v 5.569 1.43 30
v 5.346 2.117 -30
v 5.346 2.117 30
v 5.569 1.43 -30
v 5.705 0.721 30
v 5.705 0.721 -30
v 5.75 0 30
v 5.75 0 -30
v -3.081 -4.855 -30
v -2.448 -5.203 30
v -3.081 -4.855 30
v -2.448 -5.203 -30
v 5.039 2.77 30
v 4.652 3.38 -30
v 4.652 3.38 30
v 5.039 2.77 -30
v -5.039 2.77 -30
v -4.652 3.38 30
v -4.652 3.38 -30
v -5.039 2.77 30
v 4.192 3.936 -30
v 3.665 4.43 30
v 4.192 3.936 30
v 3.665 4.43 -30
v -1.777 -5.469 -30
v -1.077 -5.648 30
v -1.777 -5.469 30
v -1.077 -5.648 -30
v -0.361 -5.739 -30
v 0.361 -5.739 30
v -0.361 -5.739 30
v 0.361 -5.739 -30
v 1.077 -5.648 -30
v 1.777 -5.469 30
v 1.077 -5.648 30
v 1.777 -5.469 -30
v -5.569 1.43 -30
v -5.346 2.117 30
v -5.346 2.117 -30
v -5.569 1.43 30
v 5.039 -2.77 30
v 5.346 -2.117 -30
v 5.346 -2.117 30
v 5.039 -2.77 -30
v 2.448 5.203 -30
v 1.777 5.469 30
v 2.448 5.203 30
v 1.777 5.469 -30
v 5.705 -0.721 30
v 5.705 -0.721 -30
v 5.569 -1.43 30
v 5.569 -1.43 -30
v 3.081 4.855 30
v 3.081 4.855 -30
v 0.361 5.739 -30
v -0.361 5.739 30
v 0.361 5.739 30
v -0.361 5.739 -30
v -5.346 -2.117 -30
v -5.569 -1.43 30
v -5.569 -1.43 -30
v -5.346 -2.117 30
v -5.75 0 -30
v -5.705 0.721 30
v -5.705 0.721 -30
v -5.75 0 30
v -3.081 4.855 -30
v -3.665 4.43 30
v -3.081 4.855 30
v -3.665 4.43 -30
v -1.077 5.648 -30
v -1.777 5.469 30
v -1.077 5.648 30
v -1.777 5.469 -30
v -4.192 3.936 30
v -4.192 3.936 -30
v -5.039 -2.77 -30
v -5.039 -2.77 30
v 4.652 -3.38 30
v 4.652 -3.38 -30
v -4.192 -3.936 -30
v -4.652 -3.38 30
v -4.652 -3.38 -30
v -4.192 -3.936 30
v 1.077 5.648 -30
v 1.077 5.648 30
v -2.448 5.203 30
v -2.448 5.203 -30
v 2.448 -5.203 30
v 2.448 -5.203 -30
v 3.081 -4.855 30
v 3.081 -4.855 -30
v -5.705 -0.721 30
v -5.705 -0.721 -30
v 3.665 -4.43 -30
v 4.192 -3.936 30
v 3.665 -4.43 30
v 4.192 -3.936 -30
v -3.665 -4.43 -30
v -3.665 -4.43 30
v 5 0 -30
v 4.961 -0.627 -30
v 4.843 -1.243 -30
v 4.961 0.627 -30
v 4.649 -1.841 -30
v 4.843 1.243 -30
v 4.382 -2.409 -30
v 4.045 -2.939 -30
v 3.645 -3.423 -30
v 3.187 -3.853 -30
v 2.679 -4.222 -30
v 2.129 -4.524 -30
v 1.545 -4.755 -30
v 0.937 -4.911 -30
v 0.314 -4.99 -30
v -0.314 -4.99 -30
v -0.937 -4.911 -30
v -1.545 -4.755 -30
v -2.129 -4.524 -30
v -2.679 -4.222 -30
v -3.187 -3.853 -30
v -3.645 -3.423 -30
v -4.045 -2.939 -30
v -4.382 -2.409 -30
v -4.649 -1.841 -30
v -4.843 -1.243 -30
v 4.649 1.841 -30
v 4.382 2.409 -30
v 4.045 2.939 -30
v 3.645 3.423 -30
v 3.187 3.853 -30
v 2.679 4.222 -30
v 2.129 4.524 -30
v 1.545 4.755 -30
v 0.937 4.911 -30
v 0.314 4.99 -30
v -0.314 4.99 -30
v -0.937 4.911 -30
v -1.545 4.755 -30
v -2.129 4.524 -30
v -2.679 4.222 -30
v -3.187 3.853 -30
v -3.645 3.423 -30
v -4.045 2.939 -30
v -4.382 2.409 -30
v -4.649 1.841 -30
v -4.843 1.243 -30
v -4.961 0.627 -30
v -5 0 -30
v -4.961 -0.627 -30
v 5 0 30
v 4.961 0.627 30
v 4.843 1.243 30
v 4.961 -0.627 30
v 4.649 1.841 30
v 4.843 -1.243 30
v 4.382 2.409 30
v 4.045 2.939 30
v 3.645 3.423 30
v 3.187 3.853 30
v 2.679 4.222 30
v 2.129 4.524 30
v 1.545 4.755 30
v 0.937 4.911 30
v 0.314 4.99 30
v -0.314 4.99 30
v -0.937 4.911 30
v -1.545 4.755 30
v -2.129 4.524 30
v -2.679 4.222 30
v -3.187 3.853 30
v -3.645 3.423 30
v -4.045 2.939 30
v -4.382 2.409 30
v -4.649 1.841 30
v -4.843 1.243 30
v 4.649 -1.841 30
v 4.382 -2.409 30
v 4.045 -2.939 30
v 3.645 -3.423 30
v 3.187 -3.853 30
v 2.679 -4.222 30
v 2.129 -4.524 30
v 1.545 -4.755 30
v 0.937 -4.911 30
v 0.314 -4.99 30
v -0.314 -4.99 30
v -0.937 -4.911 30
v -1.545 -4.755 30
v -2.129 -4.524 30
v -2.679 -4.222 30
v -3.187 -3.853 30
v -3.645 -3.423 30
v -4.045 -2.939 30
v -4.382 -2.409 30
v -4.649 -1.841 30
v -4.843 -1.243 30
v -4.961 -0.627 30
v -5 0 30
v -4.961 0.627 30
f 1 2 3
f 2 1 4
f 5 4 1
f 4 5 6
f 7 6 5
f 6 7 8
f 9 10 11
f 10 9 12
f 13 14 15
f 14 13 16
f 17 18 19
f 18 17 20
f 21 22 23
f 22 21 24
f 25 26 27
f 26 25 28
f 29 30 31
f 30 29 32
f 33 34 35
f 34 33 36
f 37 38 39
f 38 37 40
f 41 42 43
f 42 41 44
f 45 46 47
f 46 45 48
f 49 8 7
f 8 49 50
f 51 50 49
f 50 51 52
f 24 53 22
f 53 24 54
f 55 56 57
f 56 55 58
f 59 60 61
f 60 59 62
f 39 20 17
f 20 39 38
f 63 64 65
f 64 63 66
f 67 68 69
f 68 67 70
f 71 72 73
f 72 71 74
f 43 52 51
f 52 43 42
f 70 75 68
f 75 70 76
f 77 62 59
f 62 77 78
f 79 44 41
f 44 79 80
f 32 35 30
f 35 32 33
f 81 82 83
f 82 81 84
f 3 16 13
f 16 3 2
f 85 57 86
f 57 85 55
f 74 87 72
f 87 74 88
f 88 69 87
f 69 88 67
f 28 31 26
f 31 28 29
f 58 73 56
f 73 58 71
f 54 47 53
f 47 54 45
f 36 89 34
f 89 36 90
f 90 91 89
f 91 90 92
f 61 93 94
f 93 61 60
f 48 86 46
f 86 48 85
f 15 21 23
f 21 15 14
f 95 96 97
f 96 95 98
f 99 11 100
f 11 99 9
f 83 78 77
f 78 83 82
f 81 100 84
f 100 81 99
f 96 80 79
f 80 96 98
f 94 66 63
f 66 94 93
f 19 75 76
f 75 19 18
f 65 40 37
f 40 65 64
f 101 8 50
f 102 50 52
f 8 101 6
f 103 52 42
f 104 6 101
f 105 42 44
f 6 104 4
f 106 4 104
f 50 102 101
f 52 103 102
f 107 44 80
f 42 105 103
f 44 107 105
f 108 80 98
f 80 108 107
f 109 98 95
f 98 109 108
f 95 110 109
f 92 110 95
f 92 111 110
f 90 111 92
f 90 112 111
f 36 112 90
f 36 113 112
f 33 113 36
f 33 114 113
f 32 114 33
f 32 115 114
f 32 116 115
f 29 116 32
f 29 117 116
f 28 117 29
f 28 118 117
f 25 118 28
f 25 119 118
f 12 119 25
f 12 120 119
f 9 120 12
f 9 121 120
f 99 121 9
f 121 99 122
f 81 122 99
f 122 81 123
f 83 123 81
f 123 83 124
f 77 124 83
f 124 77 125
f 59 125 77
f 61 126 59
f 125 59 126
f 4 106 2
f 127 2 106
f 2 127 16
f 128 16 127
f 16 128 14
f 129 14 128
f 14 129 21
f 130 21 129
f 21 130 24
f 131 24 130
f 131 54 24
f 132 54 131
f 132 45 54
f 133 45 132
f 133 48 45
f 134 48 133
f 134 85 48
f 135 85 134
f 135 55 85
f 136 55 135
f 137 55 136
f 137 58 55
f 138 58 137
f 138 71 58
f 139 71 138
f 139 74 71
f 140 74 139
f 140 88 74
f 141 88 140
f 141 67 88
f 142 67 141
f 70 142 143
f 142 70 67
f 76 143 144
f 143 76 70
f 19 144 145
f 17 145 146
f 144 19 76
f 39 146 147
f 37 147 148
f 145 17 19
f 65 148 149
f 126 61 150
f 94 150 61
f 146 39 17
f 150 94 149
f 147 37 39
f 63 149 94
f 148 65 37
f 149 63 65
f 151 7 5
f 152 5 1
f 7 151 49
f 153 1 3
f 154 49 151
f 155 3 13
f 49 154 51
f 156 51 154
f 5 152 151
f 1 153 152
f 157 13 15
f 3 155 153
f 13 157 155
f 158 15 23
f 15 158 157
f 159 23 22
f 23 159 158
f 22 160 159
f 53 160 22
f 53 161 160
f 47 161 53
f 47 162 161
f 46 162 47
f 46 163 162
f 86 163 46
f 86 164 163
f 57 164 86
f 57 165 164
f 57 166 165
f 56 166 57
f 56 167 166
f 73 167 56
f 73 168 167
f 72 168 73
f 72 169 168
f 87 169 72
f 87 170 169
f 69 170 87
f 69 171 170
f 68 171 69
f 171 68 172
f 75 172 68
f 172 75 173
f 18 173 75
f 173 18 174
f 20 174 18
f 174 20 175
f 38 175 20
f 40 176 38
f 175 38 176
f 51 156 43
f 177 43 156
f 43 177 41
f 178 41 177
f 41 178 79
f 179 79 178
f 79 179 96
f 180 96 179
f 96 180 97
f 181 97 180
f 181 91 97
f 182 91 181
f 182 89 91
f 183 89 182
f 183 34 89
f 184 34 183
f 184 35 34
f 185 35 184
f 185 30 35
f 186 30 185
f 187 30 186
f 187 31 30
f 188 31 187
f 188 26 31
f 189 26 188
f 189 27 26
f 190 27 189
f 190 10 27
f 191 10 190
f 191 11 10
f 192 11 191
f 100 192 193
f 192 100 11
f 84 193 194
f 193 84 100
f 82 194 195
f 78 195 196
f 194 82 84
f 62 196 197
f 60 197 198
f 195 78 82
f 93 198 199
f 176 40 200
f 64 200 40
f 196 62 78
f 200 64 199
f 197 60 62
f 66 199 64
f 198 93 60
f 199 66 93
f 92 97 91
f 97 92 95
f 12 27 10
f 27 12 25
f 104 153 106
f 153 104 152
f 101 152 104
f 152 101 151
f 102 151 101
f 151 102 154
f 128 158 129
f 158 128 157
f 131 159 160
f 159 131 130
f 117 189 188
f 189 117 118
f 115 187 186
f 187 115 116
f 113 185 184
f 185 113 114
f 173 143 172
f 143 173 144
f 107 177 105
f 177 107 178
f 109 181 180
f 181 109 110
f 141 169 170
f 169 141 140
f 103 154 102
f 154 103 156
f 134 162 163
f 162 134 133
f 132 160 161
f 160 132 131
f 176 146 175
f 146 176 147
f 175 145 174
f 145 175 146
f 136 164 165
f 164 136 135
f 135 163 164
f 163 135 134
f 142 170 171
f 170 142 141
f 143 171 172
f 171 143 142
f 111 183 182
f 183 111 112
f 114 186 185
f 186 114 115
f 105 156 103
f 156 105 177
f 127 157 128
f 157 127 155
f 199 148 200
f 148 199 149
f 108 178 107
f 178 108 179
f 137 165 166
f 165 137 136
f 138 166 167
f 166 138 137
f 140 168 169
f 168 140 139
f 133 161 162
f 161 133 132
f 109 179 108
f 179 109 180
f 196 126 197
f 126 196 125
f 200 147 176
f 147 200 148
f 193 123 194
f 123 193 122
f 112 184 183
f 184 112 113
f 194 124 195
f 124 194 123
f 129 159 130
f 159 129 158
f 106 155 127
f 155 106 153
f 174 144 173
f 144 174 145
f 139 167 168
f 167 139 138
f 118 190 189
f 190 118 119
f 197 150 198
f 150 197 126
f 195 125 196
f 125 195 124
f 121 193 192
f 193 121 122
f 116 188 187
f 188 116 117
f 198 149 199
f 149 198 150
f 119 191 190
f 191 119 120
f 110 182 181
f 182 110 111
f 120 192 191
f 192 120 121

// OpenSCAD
$fn = 50;


difference() {
	union() {
		translate(v = [0, 0, -30.0000000000]) {
			cylinder(h = 60, r = 5.7500000000);
		}
	}
	union() {
		translate(v = [0, 0, -100.0000000000]) {
			cylinder(h = 200, r = 5.0000000000);
		}
	}
}
